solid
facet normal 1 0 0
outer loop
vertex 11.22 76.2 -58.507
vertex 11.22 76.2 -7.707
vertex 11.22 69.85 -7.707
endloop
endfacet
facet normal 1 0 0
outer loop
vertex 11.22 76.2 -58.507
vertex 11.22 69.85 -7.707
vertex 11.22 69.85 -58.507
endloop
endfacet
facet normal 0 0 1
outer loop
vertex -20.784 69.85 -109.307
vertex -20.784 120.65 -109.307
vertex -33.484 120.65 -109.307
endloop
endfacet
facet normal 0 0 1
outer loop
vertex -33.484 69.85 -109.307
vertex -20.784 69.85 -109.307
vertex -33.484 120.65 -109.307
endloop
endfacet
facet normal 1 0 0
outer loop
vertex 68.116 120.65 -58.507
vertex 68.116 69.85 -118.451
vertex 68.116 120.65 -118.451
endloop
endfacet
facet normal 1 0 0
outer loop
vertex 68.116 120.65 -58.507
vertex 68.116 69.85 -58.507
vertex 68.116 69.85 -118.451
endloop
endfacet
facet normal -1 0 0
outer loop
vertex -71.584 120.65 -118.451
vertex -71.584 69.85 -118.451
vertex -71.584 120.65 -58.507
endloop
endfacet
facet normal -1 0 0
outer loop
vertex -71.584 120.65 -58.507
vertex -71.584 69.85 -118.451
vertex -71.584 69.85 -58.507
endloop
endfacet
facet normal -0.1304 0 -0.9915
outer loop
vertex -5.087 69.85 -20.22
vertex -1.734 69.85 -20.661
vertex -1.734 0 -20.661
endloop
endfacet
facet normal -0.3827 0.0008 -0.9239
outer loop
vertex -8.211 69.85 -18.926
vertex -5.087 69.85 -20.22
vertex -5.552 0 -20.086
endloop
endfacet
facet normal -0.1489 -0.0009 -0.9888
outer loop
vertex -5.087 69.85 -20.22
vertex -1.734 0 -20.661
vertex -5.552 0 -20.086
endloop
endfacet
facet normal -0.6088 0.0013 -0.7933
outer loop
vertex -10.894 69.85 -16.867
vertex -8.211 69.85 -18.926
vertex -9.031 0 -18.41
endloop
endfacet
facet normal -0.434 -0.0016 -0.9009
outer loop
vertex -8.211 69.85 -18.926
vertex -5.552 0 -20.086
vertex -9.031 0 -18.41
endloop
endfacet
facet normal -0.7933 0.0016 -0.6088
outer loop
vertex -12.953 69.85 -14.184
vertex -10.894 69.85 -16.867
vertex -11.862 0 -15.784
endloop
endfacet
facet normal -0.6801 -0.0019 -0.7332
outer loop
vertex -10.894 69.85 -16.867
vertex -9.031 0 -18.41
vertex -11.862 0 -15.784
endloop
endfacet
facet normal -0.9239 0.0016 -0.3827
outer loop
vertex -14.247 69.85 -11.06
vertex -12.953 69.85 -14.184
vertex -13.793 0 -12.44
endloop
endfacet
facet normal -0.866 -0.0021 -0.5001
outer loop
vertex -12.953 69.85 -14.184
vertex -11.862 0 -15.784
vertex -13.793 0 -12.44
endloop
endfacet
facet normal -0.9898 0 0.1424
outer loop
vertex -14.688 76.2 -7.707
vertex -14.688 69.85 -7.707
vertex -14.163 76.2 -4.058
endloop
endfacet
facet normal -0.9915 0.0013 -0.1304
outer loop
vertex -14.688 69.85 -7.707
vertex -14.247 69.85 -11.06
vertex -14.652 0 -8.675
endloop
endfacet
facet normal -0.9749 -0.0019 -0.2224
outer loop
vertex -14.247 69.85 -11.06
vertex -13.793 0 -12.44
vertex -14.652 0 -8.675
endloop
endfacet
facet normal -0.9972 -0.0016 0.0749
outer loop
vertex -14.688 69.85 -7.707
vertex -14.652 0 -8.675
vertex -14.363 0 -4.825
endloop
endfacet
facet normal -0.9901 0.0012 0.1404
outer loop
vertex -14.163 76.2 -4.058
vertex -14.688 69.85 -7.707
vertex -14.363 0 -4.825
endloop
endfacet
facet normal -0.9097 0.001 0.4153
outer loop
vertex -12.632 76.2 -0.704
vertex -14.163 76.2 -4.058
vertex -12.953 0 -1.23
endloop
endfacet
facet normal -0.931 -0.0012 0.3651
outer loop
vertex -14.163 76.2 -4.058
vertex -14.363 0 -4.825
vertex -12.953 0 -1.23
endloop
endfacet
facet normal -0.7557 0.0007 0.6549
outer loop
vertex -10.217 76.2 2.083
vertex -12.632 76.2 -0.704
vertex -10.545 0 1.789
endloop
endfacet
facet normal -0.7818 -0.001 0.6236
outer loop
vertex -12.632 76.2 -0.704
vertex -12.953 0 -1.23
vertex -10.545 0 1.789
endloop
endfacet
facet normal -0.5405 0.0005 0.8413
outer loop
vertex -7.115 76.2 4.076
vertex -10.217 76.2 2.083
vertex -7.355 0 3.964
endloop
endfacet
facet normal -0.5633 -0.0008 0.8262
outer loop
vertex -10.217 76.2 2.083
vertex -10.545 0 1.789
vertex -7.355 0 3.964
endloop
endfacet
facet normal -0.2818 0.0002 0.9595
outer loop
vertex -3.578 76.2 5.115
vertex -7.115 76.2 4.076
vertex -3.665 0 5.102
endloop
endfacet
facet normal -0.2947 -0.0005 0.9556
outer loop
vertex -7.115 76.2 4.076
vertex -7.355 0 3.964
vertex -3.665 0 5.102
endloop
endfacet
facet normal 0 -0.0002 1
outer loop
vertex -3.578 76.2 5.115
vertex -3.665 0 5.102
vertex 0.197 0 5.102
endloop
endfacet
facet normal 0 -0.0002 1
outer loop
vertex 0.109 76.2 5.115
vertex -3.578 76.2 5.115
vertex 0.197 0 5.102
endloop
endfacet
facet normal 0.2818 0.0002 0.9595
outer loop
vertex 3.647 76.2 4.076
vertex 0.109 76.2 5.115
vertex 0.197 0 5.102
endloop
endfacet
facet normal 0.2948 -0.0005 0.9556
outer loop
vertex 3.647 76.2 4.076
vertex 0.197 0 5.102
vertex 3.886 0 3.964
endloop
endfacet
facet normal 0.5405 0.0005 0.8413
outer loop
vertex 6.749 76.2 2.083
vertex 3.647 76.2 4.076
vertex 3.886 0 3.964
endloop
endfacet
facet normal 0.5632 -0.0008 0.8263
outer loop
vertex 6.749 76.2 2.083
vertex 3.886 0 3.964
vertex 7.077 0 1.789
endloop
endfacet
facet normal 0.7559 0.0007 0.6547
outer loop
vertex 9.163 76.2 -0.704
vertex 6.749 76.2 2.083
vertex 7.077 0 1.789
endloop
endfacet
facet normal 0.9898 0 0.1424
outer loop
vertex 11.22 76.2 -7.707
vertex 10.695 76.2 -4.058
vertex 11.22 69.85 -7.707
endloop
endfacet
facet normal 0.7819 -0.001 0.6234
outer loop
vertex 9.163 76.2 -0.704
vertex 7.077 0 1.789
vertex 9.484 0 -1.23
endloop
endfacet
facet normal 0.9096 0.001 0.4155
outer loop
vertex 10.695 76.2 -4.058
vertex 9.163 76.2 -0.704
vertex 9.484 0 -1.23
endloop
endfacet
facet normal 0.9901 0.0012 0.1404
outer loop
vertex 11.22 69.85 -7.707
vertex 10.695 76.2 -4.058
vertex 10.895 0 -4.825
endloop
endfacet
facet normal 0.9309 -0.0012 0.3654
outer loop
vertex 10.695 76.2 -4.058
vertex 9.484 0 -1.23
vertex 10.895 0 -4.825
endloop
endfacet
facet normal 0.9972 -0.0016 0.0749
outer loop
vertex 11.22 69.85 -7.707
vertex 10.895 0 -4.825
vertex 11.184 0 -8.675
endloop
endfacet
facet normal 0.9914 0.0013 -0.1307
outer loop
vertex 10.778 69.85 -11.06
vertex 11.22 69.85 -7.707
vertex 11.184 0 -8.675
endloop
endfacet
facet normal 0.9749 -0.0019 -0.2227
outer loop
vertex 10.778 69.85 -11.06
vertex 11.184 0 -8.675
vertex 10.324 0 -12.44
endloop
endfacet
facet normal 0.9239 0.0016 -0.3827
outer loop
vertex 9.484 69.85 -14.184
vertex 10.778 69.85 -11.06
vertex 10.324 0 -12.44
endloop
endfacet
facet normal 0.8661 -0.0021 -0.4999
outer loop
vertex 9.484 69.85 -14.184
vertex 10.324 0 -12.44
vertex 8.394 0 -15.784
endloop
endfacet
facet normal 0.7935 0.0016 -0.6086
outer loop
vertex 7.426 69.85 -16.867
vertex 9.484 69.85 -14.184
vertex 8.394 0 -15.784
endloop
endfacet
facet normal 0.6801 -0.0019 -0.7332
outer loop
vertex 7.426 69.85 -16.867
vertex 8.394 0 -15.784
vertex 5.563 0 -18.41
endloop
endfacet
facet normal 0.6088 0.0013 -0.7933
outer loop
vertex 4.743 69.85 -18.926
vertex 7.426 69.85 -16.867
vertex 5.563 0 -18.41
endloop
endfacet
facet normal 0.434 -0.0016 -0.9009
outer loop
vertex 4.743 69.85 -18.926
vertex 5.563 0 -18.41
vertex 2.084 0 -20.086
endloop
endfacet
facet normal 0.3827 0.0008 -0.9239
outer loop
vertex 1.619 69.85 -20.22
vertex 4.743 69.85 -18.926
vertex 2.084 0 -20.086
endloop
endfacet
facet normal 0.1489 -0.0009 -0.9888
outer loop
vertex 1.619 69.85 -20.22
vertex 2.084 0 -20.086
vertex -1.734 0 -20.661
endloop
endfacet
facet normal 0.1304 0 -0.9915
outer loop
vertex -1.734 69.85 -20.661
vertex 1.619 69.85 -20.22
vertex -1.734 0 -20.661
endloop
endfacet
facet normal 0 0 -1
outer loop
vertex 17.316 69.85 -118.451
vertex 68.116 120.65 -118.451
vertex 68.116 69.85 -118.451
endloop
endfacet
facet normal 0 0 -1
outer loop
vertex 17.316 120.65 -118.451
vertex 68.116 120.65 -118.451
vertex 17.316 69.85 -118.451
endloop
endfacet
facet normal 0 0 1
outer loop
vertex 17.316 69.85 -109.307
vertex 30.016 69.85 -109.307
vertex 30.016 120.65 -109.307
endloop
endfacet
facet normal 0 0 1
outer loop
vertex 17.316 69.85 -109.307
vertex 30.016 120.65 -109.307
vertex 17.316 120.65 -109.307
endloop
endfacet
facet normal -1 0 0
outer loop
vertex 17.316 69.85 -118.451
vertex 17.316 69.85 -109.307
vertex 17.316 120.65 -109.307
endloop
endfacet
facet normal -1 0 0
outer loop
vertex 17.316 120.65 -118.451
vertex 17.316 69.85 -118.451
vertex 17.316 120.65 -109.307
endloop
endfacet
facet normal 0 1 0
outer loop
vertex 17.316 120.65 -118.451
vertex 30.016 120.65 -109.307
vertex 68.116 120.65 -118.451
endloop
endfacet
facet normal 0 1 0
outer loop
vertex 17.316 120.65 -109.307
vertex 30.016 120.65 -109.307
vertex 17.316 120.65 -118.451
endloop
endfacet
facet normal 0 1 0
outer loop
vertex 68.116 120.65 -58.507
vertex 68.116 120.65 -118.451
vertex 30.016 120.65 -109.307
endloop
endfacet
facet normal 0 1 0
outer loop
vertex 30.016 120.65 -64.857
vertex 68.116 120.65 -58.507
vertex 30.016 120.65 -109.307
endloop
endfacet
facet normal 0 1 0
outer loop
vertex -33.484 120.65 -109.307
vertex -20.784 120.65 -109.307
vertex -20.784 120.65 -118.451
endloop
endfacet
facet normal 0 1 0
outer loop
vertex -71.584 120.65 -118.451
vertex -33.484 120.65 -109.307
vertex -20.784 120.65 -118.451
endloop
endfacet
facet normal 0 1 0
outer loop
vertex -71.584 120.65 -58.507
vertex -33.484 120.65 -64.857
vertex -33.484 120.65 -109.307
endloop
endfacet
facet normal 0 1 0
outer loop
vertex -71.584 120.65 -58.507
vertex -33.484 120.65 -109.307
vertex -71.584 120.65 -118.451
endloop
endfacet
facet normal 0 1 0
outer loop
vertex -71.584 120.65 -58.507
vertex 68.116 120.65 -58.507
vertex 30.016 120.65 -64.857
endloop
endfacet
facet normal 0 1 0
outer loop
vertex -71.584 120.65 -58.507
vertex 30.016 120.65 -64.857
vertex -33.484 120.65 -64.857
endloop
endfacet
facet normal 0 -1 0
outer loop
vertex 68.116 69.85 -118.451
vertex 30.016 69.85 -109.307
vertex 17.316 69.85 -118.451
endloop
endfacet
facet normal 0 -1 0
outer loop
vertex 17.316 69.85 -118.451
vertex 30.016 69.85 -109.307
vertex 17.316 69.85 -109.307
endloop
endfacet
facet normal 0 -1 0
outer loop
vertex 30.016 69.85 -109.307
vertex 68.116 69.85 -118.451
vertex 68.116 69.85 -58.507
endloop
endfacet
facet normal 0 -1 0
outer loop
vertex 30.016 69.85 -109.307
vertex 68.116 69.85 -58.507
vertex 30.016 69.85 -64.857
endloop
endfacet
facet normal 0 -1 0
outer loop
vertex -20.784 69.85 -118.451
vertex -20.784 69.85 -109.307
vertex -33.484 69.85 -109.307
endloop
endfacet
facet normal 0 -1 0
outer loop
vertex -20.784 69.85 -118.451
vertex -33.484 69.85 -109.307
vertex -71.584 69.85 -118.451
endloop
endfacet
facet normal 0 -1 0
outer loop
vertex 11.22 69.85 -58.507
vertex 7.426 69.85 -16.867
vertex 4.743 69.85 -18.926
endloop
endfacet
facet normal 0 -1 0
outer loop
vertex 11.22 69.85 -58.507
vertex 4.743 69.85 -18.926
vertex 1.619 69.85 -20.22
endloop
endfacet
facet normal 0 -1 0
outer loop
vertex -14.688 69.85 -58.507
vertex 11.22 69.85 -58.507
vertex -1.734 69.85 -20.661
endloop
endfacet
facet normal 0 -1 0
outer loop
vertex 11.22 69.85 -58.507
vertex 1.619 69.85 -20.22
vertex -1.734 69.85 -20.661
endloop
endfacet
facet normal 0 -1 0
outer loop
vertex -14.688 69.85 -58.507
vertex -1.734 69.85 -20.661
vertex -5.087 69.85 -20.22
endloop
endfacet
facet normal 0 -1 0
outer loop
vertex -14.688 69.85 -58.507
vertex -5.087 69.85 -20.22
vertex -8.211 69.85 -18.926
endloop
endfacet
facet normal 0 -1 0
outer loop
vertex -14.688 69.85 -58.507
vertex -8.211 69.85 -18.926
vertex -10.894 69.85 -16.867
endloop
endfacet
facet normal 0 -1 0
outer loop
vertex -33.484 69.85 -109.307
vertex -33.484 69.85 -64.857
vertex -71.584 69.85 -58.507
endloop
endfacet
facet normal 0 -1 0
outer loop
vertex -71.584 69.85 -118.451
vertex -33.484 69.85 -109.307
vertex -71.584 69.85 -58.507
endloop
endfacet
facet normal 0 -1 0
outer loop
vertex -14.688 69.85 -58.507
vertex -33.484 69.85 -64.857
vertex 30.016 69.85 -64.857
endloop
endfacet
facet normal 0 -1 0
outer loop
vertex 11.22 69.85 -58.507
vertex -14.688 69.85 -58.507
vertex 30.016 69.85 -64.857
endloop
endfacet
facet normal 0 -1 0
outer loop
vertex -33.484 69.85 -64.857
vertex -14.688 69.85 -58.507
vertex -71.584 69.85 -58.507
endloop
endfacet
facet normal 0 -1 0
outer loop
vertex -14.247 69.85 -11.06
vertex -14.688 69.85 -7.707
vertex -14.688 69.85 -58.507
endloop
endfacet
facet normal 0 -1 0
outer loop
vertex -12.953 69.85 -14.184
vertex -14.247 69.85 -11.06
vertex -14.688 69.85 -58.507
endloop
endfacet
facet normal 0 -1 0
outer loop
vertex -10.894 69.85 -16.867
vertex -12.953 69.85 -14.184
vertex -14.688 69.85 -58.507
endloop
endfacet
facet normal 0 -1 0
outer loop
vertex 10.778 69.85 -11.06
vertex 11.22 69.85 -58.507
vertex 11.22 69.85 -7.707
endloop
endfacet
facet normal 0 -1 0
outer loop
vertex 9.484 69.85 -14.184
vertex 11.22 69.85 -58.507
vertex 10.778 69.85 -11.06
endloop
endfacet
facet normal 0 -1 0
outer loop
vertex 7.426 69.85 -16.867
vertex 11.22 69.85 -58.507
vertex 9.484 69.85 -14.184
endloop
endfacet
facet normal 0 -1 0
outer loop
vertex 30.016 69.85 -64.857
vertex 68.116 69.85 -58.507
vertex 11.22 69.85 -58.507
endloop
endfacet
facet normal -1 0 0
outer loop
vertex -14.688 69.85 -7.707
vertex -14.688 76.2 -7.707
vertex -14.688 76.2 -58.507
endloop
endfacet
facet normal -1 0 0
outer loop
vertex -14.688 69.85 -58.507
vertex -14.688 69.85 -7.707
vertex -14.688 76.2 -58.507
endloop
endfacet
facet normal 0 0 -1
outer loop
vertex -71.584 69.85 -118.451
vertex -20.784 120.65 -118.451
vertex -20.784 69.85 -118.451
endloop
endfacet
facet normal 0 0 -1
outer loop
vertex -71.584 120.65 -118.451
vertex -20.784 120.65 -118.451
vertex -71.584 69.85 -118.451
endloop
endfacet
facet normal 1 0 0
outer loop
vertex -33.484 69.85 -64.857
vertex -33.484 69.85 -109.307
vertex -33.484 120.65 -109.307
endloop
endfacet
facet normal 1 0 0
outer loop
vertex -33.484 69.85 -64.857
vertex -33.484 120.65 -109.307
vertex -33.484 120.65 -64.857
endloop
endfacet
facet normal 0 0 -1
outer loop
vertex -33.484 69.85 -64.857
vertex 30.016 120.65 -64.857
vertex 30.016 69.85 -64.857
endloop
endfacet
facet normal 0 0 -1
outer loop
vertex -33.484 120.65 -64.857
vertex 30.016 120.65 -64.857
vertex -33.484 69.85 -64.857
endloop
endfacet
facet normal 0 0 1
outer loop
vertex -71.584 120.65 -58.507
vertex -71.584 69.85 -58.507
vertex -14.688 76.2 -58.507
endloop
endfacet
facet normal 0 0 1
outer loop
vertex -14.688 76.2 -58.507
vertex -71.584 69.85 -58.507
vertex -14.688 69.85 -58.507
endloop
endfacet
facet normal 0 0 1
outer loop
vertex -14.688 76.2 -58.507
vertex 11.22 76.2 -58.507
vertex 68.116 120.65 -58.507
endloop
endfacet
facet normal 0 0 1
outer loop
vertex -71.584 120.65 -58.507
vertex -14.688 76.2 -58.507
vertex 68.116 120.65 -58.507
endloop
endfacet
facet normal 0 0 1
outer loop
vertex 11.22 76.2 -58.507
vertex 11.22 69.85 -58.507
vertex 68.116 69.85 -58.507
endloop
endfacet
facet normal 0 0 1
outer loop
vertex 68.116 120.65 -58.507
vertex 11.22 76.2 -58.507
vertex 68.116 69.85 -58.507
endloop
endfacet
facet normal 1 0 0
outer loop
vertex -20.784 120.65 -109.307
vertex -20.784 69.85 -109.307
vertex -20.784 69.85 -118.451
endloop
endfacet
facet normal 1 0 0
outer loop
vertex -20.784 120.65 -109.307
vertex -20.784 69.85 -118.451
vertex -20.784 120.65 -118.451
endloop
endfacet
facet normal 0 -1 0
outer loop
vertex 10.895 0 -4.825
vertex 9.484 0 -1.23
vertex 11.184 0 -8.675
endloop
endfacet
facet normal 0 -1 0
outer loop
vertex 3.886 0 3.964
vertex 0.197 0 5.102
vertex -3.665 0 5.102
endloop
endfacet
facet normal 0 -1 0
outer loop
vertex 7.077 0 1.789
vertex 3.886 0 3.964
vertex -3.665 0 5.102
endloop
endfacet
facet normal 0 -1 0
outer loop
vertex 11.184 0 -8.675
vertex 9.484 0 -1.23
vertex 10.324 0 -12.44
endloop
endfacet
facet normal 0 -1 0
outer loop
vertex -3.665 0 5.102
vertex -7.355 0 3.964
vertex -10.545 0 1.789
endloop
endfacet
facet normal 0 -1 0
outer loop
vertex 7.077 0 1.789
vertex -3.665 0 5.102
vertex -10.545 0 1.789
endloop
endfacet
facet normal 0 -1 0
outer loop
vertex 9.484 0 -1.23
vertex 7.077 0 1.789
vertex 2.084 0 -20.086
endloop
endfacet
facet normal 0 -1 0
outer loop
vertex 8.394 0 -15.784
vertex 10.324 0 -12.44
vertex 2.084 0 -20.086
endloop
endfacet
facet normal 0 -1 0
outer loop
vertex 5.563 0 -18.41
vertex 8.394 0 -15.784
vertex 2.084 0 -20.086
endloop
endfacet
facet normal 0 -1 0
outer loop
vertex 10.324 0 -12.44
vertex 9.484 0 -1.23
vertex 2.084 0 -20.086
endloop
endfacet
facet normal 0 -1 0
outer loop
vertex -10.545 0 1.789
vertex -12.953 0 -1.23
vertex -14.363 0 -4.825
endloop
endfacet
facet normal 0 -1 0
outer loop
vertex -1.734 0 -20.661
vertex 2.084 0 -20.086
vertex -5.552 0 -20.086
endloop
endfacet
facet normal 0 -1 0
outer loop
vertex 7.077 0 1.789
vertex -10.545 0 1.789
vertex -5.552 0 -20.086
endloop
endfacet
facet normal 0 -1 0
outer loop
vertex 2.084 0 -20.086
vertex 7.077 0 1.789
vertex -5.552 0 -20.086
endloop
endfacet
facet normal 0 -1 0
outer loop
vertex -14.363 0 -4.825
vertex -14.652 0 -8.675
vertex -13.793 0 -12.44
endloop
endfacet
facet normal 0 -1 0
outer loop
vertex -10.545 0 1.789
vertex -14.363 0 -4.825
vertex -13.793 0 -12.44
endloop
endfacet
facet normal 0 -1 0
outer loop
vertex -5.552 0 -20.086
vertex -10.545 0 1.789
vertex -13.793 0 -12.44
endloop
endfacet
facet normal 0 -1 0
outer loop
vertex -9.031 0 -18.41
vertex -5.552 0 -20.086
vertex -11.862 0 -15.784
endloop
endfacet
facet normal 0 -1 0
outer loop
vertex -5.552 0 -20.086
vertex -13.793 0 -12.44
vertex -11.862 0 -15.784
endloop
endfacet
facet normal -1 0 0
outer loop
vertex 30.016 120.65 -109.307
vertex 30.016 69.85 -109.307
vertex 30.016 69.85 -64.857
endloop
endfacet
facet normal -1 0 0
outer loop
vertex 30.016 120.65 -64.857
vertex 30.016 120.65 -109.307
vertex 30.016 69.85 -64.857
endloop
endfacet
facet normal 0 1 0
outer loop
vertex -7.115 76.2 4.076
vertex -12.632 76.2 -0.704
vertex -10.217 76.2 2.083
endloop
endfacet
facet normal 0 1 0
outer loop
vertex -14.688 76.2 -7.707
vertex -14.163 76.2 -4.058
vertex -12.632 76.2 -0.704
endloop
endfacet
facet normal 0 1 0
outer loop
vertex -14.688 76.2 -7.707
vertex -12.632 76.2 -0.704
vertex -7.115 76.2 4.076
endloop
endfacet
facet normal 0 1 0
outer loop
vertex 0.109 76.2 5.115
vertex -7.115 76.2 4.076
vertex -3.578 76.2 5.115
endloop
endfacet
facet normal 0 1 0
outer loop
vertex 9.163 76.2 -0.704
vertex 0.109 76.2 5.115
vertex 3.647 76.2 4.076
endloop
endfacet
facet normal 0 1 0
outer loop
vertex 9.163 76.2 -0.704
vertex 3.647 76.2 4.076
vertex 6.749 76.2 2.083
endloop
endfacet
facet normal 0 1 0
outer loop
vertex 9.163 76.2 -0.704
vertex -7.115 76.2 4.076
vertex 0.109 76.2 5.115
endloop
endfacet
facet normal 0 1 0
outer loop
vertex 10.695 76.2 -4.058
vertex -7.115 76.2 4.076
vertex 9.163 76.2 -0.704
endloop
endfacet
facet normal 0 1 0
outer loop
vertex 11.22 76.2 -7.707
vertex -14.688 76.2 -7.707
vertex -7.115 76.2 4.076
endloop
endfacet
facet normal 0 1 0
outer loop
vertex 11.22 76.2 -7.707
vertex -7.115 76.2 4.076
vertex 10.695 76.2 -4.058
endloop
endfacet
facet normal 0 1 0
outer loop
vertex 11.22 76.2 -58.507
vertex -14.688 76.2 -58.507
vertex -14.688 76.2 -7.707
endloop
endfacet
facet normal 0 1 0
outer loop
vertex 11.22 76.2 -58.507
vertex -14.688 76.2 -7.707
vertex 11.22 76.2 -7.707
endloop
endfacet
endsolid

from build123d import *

# Parameters (mm, degrees)
SKETCH1_R           = 12.954
BOSS_EXTRUDE1_DEPTH = 76.2
SKETCH3_W           = 25.908
SKETCH3_H           = 50.8
BOSS_EXTRUDE3_DEPTH = 6.35
SKETCH7_W           = 63.5
SKETCH7_H           = 50.8
BOSS_EXTRUDE4_DEPTH = 6.35
SKETCH10_W          = 38.1
SKETCH10_H          = 50.8
BOSS_EXTRUDE6_DEPTH = 50.8
SKETCH11_W          = 50.8
SKETCH11_H          = 50.8
BOSS_EXTRUDE7_DEPTH = 9.144


with BuildPart() as part:
    # Sketch1 → Boss-Extrude1 (new body)
    with BuildSketch(Plane(origin=(0, 0, 0), x_dir=(1, 0, 0), z_dir=(0, 1, 0))):
        with Locations(Location((-1.734112165, 7.707165176, 0), (0, 0, 90))):
            Circle(SKETCH1_R)
    extrude(amount=BOSS_EXTRUDE1_DEPTH)

    # Sketch3 → Boss-Extrude3 (add)
    with BuildSketch(Plane(origin=(0, 76.2, 0), x_dir=(1, 0, 0), z_dir=(0, 1, 0))):
        with Locations((-1.734112165, 33.107165176)):
            Rectangle(SKETCH3_W, SKETCH3_H)
    extrude(amount=-BOSS_EXTRUDE3_DEPTH)

    # Sketch7 → Boss-Extrude4 (add)
    with BuildSketch(Plane(origin=(0, 0, -58.507165176), x_dir=(-1, 0, 0), z_dir=(0, 0, -1))):
        with Locations((1.734112165, 95.25)):
            Rectangle(SKETCH7_W, SKETCH7_H)
    extrude(amount=BOSS_EXTRUDE4_DEPTH)

    # Sketch10 → Boss-Extrude6 (add)
    with BuildSketch(Plane.XZ.offset(-69.85)):
        with Locations((-52.534112165, -83.907165176)):
            Rectangle(SKETCH10_W, SKETCH10_H)
        with Locations((49.065887835, -83.907165176)):
            Rectangle(SKETCH10_W, SKETCH10_H)
    extrude(amount=-BOSS_EXTRUDE6_DEPTH)

    # Sketch11 → Boss-Extrude7 (add)
    with BuildSketch(Plane(origin=(0, 0, -109.307165176), x_dir=(-1, 0, 0), z_dir=(0, 0, -1))):
        with Locations((-42.715887835, 95.25)):
            Rectangle(SKETCH11_W, SKETCH11_H)
        with Locations((46.184112165, 95.25)):
            Rectangle(SKETCH11_W, SKETCH11_H)
    extrude(amount=BOSS_EXTRUDE7_DEPTH)


solid = part.part
